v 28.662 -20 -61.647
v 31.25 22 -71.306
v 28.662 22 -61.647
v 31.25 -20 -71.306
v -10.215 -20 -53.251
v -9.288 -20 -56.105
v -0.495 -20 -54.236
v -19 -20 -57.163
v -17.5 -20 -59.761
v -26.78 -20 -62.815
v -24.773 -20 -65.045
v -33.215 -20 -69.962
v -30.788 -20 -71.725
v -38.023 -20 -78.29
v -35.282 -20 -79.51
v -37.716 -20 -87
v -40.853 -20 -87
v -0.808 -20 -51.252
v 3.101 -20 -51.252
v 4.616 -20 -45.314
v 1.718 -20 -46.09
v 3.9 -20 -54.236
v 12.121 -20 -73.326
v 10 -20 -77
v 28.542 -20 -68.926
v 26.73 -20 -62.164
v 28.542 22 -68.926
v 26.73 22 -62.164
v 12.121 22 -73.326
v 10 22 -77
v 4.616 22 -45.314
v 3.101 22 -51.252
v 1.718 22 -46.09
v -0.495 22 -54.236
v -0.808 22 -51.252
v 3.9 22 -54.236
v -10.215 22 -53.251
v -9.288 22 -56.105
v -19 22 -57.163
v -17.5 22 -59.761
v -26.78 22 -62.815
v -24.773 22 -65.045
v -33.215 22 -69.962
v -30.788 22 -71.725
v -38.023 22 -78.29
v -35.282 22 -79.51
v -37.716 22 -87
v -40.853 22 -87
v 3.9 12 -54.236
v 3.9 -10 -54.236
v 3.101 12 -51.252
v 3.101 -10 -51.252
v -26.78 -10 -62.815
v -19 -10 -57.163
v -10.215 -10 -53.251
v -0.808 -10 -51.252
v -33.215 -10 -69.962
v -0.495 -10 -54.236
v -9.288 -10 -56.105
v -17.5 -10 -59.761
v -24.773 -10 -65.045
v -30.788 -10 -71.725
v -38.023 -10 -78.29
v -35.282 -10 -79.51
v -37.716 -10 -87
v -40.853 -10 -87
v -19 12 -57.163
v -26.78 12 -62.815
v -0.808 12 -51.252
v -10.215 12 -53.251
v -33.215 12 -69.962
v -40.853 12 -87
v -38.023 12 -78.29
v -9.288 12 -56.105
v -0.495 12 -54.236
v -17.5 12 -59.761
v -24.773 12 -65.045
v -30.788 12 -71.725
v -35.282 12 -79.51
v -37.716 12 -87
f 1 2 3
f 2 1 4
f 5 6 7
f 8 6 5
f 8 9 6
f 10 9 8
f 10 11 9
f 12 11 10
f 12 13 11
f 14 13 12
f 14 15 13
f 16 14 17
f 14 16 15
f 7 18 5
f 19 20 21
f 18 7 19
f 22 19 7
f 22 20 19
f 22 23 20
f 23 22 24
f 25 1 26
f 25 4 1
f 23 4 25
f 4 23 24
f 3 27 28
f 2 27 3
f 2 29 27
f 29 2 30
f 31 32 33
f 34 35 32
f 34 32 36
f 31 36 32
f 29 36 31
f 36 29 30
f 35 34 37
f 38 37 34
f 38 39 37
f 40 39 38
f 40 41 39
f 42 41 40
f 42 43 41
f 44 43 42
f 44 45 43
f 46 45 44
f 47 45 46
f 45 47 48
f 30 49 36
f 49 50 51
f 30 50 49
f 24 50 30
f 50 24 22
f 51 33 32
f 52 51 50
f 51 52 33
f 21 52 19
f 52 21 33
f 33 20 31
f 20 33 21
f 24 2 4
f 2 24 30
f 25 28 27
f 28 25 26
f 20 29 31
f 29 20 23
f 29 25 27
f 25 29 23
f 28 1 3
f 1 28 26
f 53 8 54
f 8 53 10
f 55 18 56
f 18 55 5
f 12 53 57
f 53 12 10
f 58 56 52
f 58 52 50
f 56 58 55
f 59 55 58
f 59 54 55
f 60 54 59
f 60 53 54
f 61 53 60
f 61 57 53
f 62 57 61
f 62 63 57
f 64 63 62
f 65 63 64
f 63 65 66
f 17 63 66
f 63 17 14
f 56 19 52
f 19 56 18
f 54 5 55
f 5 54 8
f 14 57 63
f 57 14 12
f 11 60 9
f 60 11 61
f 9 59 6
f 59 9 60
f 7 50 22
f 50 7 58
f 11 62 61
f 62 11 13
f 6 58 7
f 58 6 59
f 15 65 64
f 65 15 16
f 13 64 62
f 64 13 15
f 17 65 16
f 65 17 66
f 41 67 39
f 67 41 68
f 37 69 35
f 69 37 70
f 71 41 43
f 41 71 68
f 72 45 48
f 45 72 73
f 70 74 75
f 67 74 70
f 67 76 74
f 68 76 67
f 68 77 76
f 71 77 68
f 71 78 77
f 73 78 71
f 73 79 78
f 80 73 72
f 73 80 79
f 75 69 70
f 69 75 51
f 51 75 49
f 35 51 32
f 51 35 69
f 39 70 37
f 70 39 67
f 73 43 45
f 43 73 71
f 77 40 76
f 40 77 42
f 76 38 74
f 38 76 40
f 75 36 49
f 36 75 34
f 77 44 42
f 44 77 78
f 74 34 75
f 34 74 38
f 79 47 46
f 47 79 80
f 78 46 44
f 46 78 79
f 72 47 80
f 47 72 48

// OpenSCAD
// file: galaxyS4.scad
/*
	Basic box to simulate basic size of my Galaxy S4 with Otterbox Case

*/

module galaxyS4_with_otterbox_mock() {
	color("Blue",0.5) translate([-7,-40,-75]) rotate([90,0,90]) cube([84,146,15]);
}
// file: simple_phone_stand.scad
module gripper() {
	difference() {
		cube([22,32,42]);
		translate([3,3,-4]) cube([17,30,60]);
		translate([14,10,-4]) cube([20,30,60]);
	}
}

module arm() {
	difference() {
		difference() {
			cylinder(h = 10, r=46, center=false);
			translate([0,0,-5]) cylinder(h = 20, r=43, center=false);
		}

		translate([-50,-80,-10]) cube([60,90,40]);
		translate([0,-50,-10]) cube([60,190,40]);
	}

	
}


module simple_phone_stand1() {

 	translate([10,22,-77]) rotate([90,-15,0]) gripper();

	translate([4,-10,-97]) rotate([90,0,0]) arm();

	translate([4,22,-97]) rotate([90,0,0]) arm();

}
// main file
/*

	Simple phone stand for my Galaxy S4 w/ Ottercase

*/

include <simple_phone_stand.scad>;
include <galaxyS4.scad>;


simple_phone_stand1();

//rotate([0,-15,0]) galaxyS4_with_otterbox_mock();
